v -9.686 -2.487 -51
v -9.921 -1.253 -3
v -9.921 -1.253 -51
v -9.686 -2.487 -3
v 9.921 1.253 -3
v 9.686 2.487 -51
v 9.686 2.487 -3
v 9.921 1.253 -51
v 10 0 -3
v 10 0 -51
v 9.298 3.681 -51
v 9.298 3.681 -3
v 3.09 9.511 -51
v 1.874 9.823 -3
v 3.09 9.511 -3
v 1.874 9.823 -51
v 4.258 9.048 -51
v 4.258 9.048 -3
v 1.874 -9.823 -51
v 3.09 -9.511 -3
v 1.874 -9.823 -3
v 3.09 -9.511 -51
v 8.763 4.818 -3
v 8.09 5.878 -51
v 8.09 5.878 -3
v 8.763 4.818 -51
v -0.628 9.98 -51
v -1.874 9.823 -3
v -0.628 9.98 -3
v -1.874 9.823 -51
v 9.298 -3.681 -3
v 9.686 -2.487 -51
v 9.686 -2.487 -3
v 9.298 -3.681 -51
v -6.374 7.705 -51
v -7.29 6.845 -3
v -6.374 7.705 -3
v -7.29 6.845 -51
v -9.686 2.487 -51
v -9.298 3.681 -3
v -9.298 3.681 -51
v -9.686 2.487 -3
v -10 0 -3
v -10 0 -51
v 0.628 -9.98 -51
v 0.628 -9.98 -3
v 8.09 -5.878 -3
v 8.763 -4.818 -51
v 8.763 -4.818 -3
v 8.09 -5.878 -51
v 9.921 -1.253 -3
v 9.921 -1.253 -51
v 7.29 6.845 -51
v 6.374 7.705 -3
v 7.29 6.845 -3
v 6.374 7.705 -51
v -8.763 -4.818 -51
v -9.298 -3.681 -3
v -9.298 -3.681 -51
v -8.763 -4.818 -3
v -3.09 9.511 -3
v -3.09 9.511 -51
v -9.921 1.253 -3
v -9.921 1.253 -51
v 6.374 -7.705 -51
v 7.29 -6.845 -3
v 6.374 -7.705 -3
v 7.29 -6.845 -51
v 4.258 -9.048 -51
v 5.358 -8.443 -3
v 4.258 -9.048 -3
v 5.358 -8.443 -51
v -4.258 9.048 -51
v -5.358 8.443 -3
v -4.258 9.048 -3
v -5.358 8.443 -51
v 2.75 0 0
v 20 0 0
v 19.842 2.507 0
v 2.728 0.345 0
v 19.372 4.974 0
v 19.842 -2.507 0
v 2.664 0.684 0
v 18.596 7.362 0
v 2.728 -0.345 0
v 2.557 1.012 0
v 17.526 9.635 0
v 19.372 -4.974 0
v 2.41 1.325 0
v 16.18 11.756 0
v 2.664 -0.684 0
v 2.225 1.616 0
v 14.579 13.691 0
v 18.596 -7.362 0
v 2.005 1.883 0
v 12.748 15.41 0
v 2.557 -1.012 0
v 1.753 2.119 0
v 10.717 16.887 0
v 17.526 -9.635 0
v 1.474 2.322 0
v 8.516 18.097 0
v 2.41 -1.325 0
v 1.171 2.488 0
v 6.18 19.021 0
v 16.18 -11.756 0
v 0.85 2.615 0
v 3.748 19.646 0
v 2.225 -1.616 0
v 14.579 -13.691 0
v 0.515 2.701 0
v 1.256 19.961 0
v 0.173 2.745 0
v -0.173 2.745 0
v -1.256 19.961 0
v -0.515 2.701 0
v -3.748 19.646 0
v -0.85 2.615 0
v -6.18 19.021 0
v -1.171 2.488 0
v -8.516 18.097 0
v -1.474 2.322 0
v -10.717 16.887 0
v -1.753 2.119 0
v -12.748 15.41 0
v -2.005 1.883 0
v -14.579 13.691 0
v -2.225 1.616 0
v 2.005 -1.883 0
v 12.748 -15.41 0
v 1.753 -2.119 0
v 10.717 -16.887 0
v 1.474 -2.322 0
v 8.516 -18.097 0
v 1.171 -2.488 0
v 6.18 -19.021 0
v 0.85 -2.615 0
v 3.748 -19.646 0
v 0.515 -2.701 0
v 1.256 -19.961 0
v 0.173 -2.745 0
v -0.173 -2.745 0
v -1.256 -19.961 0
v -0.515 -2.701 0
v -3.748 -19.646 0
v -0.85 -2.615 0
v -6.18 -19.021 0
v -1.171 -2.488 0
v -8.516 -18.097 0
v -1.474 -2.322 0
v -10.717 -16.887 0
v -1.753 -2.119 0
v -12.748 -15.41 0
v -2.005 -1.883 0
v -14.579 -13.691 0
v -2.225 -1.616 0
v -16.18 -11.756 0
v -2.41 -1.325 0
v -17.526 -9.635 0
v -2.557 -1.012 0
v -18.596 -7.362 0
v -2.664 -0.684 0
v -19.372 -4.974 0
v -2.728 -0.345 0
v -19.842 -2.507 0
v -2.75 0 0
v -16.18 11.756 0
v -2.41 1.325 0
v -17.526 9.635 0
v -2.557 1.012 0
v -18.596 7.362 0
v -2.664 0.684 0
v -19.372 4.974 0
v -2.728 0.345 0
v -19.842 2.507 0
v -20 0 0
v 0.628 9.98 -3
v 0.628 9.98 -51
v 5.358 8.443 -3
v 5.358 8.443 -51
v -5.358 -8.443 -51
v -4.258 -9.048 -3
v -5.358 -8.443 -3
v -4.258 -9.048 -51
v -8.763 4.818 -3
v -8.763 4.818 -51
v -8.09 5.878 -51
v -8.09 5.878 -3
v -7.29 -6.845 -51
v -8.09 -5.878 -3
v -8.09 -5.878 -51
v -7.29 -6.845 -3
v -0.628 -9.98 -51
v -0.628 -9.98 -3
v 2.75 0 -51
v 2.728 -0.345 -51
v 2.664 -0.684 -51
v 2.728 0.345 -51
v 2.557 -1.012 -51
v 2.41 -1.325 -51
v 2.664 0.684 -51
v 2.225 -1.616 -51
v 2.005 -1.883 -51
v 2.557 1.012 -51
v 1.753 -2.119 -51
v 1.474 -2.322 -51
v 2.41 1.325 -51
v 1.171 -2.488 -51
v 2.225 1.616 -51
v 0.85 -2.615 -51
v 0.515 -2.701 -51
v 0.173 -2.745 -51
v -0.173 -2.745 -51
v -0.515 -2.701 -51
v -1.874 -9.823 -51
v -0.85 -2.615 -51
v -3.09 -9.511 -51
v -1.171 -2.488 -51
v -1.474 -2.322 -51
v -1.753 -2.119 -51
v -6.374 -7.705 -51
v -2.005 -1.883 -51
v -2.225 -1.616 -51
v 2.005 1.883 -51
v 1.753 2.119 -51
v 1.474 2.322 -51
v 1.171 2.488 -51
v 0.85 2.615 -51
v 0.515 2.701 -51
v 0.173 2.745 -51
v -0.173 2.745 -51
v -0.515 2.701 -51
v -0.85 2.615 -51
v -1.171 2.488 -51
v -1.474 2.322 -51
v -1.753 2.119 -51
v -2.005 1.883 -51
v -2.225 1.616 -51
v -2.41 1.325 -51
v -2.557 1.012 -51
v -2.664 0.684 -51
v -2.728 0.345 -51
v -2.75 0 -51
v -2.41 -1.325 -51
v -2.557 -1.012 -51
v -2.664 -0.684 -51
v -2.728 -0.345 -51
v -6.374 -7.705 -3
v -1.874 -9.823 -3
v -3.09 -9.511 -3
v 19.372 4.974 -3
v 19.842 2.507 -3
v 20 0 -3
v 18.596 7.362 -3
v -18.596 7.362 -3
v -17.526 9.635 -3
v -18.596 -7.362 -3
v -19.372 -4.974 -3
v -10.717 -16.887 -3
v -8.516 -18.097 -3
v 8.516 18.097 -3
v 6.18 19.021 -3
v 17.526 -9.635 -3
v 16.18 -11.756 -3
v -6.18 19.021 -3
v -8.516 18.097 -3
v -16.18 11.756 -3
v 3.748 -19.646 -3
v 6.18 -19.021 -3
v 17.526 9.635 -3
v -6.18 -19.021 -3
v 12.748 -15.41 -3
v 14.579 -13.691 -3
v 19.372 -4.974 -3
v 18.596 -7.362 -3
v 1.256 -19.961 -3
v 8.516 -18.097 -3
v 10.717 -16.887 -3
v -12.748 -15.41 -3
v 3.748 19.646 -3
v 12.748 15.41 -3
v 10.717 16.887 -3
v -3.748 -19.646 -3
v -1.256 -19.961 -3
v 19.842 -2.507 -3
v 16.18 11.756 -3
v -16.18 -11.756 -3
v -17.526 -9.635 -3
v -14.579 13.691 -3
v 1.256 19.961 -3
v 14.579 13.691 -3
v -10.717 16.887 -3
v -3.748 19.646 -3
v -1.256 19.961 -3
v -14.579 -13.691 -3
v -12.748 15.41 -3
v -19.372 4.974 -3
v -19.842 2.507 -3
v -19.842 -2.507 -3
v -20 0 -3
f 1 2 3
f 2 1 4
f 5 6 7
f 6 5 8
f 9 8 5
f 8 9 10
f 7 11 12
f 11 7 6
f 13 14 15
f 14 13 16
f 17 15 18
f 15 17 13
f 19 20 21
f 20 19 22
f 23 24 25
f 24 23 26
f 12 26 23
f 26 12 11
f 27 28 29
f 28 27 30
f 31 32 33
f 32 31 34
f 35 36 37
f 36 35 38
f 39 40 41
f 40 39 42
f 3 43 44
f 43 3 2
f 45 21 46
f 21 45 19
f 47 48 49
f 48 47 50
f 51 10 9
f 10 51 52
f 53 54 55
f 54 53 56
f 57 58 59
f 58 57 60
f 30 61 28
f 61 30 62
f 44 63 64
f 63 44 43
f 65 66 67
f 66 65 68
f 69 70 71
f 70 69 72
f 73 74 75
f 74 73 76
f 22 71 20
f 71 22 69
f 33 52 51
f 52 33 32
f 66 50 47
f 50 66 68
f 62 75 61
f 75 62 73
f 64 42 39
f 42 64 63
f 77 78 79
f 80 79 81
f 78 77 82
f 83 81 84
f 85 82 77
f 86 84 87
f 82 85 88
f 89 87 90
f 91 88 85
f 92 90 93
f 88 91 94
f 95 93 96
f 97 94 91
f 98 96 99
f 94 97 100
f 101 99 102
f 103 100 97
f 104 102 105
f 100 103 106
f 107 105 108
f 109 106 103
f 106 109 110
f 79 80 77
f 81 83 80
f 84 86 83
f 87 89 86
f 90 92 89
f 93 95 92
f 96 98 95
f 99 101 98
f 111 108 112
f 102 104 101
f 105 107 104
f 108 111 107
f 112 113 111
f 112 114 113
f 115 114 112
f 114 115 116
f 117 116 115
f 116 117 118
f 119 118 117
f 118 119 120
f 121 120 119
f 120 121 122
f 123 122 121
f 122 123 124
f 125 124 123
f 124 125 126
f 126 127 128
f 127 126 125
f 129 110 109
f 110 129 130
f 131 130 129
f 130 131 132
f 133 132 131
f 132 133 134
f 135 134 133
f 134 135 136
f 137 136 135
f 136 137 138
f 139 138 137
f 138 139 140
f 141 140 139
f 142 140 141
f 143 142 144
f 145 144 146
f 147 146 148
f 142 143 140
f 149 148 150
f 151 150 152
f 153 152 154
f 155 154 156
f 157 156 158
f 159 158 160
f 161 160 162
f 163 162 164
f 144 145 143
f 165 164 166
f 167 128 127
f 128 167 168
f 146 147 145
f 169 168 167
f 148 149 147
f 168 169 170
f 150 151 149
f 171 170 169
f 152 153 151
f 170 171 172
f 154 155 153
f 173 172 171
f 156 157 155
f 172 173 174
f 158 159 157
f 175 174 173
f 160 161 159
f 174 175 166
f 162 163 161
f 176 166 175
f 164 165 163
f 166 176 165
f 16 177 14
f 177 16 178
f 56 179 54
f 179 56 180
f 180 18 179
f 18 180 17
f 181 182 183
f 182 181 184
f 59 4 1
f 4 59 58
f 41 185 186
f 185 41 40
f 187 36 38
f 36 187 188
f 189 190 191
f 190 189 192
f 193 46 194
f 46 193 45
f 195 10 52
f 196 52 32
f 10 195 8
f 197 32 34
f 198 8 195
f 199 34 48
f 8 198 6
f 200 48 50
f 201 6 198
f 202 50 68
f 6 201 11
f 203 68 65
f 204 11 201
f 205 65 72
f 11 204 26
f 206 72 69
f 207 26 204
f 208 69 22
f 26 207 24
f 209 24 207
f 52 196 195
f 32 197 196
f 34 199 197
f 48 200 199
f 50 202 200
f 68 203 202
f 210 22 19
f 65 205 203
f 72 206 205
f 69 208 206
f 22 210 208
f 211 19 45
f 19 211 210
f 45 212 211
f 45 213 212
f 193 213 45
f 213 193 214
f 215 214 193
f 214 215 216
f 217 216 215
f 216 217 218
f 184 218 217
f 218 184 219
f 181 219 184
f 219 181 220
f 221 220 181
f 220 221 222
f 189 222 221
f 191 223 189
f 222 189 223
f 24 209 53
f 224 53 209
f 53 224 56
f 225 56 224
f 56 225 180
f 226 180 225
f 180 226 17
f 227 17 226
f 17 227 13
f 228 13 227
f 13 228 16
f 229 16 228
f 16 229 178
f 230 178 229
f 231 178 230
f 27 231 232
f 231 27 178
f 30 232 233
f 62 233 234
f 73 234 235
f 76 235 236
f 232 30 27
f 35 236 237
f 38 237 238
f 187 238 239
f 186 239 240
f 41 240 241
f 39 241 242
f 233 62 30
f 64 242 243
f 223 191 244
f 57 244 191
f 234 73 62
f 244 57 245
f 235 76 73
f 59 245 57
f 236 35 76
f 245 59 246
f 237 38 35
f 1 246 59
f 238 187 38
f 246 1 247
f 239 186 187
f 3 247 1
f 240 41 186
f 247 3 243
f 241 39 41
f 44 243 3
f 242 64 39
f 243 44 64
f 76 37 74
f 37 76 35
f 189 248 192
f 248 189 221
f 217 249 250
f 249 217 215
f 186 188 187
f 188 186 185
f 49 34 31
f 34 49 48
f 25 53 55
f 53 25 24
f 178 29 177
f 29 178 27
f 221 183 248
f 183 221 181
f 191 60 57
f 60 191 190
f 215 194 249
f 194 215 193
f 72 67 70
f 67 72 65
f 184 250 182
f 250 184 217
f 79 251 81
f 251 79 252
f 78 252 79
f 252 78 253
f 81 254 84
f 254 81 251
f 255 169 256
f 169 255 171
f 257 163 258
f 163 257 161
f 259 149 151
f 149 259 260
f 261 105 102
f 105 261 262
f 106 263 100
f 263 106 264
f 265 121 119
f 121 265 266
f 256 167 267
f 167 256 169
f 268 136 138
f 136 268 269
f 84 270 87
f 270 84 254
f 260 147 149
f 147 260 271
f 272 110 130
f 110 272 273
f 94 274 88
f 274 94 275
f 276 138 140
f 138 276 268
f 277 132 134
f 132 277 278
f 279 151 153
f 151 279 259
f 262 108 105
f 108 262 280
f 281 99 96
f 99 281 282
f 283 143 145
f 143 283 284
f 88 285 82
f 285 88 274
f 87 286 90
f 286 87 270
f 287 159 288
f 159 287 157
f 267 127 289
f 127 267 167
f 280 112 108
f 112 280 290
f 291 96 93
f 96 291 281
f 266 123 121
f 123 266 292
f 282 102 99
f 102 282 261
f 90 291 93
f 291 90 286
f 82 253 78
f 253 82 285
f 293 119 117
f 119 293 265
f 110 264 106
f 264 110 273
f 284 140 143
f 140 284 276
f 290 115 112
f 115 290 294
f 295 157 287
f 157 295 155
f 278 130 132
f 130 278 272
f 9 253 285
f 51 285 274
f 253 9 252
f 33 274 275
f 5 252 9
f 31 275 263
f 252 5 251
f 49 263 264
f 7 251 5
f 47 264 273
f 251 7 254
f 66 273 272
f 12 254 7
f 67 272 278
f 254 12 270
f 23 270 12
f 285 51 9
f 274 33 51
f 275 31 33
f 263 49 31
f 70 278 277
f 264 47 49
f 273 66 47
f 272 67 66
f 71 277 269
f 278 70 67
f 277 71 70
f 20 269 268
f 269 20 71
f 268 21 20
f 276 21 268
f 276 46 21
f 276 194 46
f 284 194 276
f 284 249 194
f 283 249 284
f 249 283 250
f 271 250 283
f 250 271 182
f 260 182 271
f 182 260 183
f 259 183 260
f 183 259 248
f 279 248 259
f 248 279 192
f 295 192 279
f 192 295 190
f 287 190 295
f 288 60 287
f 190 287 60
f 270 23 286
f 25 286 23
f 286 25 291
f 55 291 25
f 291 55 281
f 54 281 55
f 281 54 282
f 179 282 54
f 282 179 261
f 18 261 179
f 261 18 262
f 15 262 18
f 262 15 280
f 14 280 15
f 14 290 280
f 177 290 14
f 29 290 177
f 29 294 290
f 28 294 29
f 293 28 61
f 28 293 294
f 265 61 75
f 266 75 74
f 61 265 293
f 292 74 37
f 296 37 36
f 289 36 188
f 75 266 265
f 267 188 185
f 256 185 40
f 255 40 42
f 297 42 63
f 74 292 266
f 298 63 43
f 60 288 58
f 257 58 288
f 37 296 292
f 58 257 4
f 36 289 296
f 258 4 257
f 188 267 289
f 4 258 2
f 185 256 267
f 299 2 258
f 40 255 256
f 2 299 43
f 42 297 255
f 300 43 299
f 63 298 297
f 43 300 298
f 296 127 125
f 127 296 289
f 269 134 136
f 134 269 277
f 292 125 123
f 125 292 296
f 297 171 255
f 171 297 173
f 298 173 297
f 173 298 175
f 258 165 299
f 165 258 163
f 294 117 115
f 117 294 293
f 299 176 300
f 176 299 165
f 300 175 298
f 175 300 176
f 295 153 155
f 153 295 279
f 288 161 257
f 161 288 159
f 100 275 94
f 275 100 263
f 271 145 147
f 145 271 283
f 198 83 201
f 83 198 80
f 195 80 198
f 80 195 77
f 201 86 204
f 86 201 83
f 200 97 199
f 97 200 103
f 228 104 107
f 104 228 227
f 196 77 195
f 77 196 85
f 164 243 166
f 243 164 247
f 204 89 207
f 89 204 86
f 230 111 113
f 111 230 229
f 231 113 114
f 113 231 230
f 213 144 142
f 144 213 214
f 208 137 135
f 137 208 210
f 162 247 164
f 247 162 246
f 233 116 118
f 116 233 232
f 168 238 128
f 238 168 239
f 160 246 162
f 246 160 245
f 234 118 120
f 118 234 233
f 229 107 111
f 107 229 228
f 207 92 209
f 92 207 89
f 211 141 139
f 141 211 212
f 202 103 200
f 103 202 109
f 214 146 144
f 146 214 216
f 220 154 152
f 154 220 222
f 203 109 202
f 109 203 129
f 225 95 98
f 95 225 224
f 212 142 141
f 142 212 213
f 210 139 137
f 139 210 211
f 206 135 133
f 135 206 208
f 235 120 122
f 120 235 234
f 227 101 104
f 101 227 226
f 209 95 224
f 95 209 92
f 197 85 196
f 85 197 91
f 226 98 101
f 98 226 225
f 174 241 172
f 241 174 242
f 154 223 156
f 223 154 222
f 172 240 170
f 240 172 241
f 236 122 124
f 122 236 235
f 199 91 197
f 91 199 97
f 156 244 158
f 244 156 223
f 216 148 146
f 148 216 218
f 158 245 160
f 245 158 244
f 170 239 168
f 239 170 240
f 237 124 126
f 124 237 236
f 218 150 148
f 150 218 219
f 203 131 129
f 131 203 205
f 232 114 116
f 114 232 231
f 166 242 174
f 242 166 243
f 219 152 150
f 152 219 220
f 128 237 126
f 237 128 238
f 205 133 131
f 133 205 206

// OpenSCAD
$fn = 50;


difference() {
	union() {
		translate(v = [0, 0, -51.0000000000]) {
			cylinder(h = 51, r = 10.0000000000);
		}
		translate(v = [0, 0, -3.0000000000]) {
			cylinder(h = 3, r = 20.0000000000);
		}
	}
	union() {
		#translate(v = [0, 0, -51]) {
			cylinder(h = 51, r = 2.7500000000);
		}
	}
}
